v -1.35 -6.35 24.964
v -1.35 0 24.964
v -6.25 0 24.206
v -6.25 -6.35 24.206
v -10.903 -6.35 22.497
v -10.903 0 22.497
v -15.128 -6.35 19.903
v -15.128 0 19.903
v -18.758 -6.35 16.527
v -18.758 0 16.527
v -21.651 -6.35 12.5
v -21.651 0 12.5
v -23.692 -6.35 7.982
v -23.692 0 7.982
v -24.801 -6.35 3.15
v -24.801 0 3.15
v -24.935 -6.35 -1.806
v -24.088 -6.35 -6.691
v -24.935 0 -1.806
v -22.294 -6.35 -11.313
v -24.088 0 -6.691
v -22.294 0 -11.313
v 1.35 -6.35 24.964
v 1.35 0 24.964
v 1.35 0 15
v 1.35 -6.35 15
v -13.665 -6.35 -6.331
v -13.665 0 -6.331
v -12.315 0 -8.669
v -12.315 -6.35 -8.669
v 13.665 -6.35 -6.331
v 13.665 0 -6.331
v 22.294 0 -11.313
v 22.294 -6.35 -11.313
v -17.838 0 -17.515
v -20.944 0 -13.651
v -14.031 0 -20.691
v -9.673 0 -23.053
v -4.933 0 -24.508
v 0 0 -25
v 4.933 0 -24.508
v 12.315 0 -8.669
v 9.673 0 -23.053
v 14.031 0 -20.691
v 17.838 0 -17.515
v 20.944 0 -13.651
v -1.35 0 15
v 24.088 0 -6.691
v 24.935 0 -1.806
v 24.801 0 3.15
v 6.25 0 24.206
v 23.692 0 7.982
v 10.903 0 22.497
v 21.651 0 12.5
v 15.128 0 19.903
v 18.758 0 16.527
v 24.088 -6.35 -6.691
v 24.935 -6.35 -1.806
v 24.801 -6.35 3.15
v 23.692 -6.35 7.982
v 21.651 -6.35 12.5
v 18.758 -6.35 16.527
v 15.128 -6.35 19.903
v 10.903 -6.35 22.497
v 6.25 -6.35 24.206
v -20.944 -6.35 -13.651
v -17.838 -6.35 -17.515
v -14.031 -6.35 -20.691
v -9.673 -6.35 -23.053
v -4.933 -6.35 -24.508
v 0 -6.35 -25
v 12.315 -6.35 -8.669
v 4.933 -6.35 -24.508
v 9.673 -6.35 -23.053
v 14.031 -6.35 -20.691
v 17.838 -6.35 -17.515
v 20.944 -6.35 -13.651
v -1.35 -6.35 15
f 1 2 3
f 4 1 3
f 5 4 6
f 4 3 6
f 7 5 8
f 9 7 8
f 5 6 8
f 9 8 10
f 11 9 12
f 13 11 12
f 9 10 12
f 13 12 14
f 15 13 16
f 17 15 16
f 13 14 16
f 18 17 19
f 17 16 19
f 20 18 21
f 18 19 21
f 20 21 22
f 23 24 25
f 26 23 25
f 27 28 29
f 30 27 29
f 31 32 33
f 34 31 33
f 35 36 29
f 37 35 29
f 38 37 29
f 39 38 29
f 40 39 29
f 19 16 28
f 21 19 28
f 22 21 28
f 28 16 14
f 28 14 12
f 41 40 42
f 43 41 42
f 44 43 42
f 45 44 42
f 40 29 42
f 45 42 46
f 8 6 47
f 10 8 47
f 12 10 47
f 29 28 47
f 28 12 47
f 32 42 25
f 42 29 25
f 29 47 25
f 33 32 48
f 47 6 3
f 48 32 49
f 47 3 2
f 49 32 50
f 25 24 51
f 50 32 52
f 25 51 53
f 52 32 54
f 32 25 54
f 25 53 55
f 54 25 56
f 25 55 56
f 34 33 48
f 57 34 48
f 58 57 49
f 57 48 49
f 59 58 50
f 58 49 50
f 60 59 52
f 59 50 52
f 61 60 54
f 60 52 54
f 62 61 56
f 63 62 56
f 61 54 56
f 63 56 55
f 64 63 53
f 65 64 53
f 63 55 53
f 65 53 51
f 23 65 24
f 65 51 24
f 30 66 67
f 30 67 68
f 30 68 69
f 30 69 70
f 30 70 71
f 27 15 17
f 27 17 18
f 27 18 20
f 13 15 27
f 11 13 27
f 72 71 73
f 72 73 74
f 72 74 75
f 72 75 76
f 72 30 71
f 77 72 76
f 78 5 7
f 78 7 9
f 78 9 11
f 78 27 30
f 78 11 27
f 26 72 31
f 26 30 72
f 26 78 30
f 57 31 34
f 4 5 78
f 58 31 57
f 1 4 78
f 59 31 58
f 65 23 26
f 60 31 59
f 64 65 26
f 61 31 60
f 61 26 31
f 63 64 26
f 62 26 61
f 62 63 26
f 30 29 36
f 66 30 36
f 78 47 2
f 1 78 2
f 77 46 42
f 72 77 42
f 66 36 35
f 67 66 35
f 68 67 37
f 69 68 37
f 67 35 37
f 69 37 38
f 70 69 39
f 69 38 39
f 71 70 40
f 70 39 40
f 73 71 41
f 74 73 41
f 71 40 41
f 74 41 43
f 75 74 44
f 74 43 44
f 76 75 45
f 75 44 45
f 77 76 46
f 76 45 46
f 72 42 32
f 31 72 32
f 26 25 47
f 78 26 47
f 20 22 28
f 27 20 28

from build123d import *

# Parameters (mm, degrees)
F1_DEPTH = 6.35


with BuildPart() as f1:
    # F0 (on Front) → F1 (new body)
    with BuildSketch(Plane.XZ):
        with BuildLine():
            Line((-1.35, 15), (-1.35, 24.963523))
            ThreePointArc((-1.35, 24.963523), (-21.650635, 12.5), (-22.294045, -11.312627))
            Line((-22.294045, -11.312627), (-13.665381, -6.330866))
            Line((-13.665381, -6.330866), (-12.315381, -8.669134))
            Line((-12.315381, -8.669134), (-20.944045, -13.650896))
            ThreePointArc((-20.944045, -13.650896), (0, -25), (20.944045, -13.650896))
            Line((20.944045, -13.650896), (12.315381, -8.669134))
            Line((12.315381, -8.669134), (13.665381, -6.330866))
            Line((13.665381, -6.330866), (22.294045, -11.312627))
            ThreePointArc((22.294045, -11.312627), (21.650635, 12.5), (1.35, 24.963523))
            Line((1.35, 24.963523), (1.35, 15))
            Line((1.35, 15), (-1.35, 15))
        make_face()
    extrude(amount=F1_DEPTH)


solid = f1.part
